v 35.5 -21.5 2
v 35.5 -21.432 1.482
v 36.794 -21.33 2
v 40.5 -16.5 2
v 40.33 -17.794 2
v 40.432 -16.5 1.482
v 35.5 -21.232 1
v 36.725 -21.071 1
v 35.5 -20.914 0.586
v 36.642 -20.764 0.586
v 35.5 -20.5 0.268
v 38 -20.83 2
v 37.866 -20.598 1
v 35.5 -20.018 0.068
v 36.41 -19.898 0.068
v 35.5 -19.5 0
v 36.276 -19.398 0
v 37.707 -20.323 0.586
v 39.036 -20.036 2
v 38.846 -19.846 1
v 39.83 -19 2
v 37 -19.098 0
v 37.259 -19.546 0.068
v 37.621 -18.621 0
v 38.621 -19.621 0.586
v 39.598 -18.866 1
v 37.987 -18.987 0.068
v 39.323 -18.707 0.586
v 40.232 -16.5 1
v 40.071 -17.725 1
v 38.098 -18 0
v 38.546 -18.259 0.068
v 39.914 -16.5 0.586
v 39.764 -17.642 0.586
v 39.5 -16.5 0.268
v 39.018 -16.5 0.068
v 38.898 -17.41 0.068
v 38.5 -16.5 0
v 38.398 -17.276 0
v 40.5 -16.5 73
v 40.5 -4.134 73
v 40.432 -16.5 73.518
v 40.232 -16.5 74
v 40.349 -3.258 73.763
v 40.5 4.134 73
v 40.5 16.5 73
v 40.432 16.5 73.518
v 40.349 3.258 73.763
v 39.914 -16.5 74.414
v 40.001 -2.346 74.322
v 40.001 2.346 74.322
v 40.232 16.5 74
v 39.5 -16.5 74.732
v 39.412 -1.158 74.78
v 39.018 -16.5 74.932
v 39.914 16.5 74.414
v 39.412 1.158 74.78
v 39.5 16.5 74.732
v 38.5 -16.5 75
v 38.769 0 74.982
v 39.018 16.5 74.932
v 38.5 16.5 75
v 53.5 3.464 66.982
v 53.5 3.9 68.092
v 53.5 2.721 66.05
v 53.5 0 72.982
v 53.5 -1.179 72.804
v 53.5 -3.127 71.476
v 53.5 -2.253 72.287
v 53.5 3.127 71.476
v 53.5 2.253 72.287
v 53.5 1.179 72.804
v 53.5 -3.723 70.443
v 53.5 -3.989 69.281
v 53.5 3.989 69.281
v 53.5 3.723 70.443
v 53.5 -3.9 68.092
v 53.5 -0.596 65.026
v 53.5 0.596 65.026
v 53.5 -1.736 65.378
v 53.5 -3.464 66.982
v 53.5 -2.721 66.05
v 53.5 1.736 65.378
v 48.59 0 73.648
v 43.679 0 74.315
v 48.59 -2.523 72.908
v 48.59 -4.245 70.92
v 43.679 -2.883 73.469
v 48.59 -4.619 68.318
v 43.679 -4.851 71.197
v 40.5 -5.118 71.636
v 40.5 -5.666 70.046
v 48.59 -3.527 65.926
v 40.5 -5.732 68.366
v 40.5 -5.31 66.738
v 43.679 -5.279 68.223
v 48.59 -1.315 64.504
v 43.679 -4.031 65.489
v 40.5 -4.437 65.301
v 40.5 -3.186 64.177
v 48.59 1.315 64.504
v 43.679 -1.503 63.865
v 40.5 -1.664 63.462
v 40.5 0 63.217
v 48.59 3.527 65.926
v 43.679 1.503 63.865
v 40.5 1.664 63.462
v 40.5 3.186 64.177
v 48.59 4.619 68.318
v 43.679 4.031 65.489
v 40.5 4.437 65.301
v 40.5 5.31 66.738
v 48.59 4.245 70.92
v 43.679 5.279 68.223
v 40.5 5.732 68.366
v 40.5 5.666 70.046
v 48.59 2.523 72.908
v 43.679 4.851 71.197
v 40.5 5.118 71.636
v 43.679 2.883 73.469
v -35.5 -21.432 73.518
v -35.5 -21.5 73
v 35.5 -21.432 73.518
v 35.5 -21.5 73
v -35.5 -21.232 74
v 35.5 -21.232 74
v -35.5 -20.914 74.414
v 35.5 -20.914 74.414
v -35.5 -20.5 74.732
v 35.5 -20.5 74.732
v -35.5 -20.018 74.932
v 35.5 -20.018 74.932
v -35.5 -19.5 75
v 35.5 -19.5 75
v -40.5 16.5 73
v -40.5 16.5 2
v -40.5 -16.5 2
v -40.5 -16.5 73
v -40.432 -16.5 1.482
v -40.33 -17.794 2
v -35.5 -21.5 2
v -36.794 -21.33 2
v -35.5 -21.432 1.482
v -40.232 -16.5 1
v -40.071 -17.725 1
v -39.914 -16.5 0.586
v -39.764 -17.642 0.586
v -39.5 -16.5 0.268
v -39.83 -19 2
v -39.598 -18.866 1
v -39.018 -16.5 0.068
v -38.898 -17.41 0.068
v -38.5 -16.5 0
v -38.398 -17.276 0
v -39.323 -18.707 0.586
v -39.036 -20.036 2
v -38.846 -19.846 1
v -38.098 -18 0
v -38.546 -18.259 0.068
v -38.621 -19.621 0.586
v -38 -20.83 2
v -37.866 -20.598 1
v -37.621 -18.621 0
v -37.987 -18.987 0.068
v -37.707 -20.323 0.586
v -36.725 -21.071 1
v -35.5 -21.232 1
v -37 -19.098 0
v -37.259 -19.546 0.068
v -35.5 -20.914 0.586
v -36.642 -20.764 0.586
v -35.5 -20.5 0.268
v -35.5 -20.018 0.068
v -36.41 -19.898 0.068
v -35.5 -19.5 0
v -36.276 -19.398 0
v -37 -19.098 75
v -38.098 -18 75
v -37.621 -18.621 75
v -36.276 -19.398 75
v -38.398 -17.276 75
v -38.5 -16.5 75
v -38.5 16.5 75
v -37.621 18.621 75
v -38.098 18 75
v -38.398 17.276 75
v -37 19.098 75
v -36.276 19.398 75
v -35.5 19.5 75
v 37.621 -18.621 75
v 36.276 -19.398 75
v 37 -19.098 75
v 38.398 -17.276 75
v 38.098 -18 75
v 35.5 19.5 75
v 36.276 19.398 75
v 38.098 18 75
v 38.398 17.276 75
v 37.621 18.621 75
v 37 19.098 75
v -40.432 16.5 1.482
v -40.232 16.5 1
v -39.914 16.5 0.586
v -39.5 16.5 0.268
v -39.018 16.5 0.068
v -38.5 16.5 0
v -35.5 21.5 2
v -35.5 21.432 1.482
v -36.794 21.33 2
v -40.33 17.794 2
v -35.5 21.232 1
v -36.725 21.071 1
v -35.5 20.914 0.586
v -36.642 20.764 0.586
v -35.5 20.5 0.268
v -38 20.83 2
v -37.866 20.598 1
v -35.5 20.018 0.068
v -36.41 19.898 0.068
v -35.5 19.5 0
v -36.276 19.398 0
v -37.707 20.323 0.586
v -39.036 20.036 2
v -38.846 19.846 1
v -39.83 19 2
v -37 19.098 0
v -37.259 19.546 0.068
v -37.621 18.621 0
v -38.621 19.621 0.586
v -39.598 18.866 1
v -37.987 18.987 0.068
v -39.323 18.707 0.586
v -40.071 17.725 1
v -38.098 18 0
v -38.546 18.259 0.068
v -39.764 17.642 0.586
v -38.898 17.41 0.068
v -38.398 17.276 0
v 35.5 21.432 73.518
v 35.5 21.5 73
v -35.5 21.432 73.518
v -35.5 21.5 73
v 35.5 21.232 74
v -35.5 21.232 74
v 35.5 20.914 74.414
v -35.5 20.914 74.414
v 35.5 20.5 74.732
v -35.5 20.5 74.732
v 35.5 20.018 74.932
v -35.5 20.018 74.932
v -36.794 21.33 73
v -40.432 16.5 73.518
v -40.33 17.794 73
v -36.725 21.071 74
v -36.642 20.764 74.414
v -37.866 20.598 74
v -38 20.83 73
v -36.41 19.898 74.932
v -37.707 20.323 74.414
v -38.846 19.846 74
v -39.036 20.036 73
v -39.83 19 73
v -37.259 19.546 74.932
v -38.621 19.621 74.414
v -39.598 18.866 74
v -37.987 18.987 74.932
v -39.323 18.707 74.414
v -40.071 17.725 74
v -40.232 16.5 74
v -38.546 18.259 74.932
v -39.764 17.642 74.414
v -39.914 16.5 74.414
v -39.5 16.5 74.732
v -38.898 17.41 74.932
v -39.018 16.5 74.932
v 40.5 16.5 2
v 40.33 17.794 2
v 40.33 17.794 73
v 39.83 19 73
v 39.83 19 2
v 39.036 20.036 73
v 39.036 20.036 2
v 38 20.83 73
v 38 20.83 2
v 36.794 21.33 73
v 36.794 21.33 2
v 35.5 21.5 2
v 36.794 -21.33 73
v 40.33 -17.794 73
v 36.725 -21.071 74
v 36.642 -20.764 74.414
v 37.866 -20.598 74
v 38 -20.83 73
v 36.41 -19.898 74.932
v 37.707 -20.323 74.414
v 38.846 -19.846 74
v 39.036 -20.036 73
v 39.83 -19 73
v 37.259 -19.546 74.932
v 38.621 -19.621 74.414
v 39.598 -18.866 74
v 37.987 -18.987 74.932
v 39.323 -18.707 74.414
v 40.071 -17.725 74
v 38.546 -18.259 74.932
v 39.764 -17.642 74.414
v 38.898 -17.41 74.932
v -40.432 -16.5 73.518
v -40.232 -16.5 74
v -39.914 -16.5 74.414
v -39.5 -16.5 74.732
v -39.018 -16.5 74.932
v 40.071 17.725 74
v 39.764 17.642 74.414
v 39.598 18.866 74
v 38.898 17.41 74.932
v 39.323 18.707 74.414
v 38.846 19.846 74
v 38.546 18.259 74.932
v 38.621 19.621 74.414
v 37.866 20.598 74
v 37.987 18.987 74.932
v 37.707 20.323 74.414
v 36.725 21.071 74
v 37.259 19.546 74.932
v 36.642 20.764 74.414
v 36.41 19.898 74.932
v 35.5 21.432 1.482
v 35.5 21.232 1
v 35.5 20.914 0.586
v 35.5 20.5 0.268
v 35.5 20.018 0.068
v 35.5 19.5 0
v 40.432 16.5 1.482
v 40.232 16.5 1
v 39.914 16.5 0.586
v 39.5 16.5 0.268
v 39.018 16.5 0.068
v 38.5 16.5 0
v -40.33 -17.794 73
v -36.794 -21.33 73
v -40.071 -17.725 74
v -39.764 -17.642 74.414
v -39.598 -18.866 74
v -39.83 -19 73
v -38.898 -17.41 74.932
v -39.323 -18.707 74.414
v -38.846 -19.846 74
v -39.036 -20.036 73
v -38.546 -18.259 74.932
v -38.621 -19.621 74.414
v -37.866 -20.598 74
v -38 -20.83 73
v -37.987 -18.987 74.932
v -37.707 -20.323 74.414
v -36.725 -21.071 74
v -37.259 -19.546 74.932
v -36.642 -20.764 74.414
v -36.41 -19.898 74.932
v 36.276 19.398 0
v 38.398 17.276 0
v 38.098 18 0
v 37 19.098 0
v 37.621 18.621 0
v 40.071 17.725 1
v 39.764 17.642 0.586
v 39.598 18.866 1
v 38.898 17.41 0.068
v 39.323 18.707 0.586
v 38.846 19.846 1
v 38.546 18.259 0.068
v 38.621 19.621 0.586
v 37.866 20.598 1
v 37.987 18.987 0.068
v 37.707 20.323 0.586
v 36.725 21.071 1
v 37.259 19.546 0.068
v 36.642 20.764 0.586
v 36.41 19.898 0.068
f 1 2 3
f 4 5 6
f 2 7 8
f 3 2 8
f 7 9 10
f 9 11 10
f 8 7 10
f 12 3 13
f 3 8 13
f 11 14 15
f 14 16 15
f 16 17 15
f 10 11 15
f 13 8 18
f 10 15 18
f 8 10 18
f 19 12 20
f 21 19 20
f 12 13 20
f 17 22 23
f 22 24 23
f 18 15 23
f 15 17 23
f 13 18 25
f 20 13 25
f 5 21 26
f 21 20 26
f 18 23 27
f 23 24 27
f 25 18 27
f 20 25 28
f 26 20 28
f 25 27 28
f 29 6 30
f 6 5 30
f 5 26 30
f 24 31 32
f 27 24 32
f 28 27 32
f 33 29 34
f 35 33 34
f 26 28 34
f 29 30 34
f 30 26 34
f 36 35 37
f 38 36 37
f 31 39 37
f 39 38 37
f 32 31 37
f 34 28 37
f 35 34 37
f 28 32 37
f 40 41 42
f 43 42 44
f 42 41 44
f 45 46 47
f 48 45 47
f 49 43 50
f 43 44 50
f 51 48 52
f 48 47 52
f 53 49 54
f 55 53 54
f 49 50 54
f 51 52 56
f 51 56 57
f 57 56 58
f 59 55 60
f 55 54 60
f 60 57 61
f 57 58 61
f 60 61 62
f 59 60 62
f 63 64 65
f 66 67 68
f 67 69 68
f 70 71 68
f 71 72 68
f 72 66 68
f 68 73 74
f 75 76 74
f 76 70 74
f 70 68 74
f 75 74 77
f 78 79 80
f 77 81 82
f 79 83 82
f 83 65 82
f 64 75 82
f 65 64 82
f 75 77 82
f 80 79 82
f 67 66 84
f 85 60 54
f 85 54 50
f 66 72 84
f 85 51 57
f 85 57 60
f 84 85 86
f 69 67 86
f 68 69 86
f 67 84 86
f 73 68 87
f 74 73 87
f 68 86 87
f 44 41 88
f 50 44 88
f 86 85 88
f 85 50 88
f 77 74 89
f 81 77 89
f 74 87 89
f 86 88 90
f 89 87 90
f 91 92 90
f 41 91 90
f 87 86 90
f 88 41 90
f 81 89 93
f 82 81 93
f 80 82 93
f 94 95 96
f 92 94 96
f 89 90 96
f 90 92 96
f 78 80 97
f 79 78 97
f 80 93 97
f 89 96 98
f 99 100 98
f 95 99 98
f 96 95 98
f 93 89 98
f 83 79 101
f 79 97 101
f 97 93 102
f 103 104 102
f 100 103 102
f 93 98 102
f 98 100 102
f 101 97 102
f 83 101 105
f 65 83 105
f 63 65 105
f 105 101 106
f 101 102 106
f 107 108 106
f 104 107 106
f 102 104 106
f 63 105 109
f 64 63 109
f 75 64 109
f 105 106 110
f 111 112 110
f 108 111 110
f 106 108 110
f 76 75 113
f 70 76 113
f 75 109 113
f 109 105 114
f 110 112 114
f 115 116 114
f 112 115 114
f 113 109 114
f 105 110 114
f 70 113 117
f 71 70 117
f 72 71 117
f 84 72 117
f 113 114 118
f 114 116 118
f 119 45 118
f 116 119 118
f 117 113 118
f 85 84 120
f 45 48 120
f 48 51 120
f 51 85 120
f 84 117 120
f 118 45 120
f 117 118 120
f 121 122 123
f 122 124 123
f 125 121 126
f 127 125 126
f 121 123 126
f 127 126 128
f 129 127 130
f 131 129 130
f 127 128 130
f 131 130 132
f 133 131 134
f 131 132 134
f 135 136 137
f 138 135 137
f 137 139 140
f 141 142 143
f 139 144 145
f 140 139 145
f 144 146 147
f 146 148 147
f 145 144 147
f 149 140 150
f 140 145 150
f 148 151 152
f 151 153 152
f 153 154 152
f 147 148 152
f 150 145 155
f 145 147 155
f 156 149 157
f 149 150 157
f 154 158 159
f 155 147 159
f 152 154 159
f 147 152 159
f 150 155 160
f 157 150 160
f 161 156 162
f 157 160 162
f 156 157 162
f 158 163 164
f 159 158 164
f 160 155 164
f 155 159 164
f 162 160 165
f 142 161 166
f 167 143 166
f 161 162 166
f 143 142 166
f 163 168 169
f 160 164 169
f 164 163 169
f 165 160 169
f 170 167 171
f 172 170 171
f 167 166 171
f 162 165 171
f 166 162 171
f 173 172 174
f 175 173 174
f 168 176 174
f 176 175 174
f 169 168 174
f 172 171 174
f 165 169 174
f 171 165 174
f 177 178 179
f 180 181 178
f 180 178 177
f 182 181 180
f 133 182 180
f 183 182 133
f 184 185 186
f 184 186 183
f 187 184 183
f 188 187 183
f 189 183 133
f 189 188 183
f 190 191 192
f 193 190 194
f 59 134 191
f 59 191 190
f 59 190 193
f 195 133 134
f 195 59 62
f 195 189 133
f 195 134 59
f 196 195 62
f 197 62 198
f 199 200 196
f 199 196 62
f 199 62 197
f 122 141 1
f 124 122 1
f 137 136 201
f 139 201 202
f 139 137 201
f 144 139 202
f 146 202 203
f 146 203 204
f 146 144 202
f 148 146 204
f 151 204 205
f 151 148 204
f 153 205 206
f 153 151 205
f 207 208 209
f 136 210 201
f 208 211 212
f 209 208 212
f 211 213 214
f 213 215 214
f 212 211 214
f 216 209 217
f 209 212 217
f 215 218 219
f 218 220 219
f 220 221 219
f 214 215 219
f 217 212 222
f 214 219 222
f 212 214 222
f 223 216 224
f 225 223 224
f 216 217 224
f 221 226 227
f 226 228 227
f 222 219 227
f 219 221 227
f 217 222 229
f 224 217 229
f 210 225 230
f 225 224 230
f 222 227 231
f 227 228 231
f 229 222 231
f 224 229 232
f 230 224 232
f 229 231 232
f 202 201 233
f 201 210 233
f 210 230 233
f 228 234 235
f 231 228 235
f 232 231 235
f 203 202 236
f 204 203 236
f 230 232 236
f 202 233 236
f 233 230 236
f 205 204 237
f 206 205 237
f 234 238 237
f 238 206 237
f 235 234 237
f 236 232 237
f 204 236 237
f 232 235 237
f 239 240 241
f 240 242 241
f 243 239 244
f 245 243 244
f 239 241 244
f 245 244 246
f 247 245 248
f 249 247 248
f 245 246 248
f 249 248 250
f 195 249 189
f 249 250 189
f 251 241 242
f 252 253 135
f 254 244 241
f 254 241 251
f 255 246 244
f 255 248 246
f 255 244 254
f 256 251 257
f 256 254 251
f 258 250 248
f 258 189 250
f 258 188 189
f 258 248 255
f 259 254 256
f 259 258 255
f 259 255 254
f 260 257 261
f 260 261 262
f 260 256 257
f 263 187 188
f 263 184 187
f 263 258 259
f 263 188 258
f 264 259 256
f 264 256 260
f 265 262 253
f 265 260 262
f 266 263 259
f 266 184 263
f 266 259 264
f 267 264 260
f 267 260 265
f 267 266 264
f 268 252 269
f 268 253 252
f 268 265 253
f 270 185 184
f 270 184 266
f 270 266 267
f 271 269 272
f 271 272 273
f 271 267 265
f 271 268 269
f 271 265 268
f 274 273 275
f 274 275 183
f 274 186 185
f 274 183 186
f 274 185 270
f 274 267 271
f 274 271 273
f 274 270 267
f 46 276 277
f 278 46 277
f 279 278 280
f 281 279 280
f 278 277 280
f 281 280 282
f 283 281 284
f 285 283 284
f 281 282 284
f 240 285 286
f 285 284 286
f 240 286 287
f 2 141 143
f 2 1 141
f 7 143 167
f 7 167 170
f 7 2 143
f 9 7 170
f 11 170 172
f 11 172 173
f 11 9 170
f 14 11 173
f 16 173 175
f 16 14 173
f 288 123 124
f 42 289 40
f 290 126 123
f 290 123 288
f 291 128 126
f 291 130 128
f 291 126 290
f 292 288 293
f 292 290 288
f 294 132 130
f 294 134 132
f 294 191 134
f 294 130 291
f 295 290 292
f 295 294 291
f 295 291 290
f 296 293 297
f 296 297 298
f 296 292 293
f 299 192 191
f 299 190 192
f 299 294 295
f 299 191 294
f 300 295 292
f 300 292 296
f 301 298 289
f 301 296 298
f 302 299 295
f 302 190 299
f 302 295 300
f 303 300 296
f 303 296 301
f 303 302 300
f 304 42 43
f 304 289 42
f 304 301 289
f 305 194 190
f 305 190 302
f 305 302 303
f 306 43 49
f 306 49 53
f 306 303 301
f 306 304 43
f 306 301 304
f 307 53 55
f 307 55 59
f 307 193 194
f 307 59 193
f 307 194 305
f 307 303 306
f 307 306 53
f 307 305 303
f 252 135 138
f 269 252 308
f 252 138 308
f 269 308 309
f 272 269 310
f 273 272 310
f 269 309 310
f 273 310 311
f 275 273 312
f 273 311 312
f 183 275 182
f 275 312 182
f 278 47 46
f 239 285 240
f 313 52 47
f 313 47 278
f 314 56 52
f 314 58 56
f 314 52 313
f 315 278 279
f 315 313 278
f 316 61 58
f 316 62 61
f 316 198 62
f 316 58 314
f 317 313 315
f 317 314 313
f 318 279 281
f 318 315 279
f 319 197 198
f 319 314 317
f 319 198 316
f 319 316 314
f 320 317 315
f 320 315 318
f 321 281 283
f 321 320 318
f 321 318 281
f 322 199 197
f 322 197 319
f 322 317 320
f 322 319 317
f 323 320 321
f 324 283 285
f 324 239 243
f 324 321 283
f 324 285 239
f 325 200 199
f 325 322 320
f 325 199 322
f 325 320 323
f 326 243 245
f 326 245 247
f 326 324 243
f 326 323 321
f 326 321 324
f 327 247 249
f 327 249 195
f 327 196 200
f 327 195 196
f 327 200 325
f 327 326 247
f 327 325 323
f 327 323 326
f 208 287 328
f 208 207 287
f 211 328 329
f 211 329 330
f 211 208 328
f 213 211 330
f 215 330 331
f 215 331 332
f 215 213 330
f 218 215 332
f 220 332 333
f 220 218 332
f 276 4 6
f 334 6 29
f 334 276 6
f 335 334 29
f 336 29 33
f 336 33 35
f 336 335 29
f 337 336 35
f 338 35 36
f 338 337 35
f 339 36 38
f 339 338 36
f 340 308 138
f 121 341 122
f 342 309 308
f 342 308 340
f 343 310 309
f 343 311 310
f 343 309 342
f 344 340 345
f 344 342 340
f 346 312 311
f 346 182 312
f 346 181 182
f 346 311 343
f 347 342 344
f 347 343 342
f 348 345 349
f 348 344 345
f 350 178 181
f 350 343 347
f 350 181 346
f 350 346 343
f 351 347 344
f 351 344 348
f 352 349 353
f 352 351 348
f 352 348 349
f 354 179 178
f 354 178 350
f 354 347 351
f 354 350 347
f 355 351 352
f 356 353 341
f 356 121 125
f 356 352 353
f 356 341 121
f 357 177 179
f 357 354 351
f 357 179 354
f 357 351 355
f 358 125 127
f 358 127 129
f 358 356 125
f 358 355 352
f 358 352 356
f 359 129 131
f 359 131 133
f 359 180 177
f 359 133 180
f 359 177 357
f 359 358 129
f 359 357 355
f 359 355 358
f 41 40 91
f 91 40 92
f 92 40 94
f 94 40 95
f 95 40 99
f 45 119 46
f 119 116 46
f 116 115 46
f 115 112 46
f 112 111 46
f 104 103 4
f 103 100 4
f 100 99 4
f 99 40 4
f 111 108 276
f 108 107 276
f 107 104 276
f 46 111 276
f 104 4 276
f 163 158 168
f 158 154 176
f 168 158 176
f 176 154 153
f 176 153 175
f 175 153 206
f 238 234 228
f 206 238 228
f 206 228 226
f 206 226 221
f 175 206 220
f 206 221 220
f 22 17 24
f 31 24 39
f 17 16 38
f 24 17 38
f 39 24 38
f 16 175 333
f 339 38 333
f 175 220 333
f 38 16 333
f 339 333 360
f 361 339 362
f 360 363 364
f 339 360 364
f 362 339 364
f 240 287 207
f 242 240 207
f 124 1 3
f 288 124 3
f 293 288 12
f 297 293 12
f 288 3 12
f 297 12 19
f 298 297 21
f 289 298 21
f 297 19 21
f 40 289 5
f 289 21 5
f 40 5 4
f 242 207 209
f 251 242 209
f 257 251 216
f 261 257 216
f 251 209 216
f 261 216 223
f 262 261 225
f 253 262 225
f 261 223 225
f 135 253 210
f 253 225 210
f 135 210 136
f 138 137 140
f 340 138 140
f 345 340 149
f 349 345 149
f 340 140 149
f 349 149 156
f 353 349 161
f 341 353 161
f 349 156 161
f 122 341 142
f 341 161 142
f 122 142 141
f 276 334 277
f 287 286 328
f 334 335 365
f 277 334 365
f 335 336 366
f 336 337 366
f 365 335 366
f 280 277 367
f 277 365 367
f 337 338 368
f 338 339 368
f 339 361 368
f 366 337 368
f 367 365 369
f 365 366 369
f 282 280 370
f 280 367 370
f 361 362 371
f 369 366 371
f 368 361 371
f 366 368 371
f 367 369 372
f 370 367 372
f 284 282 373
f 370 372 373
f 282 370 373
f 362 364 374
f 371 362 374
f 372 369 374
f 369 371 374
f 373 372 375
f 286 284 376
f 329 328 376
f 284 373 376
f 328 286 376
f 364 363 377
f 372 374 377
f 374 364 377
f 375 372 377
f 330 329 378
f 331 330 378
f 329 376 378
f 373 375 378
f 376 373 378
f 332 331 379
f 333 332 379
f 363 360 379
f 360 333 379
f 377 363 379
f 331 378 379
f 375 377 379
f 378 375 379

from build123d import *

# Parameters (mm, degrees)
F1_DEPTH = 75
F2_R     = 2


with BuildPart() as f1:
    # F0 (on Top) → F1 (new body)
    with BuildSketch(Plane.XY):
        with BuildLine():
            Line((35.5, 21.5), (-35.5, 21.5))
            ThreePointArc((-35.5, 21.5), (-39.035534, 20.035534), (-40.5, 16.5))
            Line((-40.5, 16.5), (-40.5, -16.5))
            ThreePointArc((-40.5, -16.5), (-39.035534, -20.035534), (-35.5, -21.5))
            Line((-35.5, -21.5), (35.5, -21.5))
            ThreePointArc((35.5, -21.5), (39.035534, -20.035534), (40.5, -16.5))
            Line((40.5, -16.5), (40.5, 16.5))
            ThreePointArc((40.5, 16.5), (39.035534, 20.035534), (35.5, 21.5))
        make_face()
    extrude(amount=F1_DEPTH)

    # F2
    f2_edges = [f1.edges().sort_by_distance(p)[0] for p in [
        (0, 21.5, 75),
        (-39.035534, 20.035534, 75),
        (-40.5, 0, 75),
        (-39.035534, -20.035534, 75),
        (0, -21.5, 75),
        (39.035534, -20.035534, 75),
        (40.5, 0, 75),
        (39.035534, 20.035534, 75),
        (0, 21.5, 0),
        (-39.035534, 20.035534, 0),
        (-40.5, 0, 0),
        (-39.035534, -20.035534, 0),
        (0, -21.5, 0),
        (39.035534, -20.035534, 0),
        (40.5, 0, 0),
        (39.035534, 20.035534, 0),
    ]]
    fillet(f2_edges, radius=F2_R)

    # F3 (on Front) → F4 (revolve)
    with BuildSketch(Plane.XZ):
        Polygon((38.769069, 74.981818), (40.5, 68.981818), (53.5, 68.981818), (53.5, 72.981818), align=None)
    revolve(axis=Axis((47, 0, 68.981818), (1, 0, 0)))


solid = f1.part
